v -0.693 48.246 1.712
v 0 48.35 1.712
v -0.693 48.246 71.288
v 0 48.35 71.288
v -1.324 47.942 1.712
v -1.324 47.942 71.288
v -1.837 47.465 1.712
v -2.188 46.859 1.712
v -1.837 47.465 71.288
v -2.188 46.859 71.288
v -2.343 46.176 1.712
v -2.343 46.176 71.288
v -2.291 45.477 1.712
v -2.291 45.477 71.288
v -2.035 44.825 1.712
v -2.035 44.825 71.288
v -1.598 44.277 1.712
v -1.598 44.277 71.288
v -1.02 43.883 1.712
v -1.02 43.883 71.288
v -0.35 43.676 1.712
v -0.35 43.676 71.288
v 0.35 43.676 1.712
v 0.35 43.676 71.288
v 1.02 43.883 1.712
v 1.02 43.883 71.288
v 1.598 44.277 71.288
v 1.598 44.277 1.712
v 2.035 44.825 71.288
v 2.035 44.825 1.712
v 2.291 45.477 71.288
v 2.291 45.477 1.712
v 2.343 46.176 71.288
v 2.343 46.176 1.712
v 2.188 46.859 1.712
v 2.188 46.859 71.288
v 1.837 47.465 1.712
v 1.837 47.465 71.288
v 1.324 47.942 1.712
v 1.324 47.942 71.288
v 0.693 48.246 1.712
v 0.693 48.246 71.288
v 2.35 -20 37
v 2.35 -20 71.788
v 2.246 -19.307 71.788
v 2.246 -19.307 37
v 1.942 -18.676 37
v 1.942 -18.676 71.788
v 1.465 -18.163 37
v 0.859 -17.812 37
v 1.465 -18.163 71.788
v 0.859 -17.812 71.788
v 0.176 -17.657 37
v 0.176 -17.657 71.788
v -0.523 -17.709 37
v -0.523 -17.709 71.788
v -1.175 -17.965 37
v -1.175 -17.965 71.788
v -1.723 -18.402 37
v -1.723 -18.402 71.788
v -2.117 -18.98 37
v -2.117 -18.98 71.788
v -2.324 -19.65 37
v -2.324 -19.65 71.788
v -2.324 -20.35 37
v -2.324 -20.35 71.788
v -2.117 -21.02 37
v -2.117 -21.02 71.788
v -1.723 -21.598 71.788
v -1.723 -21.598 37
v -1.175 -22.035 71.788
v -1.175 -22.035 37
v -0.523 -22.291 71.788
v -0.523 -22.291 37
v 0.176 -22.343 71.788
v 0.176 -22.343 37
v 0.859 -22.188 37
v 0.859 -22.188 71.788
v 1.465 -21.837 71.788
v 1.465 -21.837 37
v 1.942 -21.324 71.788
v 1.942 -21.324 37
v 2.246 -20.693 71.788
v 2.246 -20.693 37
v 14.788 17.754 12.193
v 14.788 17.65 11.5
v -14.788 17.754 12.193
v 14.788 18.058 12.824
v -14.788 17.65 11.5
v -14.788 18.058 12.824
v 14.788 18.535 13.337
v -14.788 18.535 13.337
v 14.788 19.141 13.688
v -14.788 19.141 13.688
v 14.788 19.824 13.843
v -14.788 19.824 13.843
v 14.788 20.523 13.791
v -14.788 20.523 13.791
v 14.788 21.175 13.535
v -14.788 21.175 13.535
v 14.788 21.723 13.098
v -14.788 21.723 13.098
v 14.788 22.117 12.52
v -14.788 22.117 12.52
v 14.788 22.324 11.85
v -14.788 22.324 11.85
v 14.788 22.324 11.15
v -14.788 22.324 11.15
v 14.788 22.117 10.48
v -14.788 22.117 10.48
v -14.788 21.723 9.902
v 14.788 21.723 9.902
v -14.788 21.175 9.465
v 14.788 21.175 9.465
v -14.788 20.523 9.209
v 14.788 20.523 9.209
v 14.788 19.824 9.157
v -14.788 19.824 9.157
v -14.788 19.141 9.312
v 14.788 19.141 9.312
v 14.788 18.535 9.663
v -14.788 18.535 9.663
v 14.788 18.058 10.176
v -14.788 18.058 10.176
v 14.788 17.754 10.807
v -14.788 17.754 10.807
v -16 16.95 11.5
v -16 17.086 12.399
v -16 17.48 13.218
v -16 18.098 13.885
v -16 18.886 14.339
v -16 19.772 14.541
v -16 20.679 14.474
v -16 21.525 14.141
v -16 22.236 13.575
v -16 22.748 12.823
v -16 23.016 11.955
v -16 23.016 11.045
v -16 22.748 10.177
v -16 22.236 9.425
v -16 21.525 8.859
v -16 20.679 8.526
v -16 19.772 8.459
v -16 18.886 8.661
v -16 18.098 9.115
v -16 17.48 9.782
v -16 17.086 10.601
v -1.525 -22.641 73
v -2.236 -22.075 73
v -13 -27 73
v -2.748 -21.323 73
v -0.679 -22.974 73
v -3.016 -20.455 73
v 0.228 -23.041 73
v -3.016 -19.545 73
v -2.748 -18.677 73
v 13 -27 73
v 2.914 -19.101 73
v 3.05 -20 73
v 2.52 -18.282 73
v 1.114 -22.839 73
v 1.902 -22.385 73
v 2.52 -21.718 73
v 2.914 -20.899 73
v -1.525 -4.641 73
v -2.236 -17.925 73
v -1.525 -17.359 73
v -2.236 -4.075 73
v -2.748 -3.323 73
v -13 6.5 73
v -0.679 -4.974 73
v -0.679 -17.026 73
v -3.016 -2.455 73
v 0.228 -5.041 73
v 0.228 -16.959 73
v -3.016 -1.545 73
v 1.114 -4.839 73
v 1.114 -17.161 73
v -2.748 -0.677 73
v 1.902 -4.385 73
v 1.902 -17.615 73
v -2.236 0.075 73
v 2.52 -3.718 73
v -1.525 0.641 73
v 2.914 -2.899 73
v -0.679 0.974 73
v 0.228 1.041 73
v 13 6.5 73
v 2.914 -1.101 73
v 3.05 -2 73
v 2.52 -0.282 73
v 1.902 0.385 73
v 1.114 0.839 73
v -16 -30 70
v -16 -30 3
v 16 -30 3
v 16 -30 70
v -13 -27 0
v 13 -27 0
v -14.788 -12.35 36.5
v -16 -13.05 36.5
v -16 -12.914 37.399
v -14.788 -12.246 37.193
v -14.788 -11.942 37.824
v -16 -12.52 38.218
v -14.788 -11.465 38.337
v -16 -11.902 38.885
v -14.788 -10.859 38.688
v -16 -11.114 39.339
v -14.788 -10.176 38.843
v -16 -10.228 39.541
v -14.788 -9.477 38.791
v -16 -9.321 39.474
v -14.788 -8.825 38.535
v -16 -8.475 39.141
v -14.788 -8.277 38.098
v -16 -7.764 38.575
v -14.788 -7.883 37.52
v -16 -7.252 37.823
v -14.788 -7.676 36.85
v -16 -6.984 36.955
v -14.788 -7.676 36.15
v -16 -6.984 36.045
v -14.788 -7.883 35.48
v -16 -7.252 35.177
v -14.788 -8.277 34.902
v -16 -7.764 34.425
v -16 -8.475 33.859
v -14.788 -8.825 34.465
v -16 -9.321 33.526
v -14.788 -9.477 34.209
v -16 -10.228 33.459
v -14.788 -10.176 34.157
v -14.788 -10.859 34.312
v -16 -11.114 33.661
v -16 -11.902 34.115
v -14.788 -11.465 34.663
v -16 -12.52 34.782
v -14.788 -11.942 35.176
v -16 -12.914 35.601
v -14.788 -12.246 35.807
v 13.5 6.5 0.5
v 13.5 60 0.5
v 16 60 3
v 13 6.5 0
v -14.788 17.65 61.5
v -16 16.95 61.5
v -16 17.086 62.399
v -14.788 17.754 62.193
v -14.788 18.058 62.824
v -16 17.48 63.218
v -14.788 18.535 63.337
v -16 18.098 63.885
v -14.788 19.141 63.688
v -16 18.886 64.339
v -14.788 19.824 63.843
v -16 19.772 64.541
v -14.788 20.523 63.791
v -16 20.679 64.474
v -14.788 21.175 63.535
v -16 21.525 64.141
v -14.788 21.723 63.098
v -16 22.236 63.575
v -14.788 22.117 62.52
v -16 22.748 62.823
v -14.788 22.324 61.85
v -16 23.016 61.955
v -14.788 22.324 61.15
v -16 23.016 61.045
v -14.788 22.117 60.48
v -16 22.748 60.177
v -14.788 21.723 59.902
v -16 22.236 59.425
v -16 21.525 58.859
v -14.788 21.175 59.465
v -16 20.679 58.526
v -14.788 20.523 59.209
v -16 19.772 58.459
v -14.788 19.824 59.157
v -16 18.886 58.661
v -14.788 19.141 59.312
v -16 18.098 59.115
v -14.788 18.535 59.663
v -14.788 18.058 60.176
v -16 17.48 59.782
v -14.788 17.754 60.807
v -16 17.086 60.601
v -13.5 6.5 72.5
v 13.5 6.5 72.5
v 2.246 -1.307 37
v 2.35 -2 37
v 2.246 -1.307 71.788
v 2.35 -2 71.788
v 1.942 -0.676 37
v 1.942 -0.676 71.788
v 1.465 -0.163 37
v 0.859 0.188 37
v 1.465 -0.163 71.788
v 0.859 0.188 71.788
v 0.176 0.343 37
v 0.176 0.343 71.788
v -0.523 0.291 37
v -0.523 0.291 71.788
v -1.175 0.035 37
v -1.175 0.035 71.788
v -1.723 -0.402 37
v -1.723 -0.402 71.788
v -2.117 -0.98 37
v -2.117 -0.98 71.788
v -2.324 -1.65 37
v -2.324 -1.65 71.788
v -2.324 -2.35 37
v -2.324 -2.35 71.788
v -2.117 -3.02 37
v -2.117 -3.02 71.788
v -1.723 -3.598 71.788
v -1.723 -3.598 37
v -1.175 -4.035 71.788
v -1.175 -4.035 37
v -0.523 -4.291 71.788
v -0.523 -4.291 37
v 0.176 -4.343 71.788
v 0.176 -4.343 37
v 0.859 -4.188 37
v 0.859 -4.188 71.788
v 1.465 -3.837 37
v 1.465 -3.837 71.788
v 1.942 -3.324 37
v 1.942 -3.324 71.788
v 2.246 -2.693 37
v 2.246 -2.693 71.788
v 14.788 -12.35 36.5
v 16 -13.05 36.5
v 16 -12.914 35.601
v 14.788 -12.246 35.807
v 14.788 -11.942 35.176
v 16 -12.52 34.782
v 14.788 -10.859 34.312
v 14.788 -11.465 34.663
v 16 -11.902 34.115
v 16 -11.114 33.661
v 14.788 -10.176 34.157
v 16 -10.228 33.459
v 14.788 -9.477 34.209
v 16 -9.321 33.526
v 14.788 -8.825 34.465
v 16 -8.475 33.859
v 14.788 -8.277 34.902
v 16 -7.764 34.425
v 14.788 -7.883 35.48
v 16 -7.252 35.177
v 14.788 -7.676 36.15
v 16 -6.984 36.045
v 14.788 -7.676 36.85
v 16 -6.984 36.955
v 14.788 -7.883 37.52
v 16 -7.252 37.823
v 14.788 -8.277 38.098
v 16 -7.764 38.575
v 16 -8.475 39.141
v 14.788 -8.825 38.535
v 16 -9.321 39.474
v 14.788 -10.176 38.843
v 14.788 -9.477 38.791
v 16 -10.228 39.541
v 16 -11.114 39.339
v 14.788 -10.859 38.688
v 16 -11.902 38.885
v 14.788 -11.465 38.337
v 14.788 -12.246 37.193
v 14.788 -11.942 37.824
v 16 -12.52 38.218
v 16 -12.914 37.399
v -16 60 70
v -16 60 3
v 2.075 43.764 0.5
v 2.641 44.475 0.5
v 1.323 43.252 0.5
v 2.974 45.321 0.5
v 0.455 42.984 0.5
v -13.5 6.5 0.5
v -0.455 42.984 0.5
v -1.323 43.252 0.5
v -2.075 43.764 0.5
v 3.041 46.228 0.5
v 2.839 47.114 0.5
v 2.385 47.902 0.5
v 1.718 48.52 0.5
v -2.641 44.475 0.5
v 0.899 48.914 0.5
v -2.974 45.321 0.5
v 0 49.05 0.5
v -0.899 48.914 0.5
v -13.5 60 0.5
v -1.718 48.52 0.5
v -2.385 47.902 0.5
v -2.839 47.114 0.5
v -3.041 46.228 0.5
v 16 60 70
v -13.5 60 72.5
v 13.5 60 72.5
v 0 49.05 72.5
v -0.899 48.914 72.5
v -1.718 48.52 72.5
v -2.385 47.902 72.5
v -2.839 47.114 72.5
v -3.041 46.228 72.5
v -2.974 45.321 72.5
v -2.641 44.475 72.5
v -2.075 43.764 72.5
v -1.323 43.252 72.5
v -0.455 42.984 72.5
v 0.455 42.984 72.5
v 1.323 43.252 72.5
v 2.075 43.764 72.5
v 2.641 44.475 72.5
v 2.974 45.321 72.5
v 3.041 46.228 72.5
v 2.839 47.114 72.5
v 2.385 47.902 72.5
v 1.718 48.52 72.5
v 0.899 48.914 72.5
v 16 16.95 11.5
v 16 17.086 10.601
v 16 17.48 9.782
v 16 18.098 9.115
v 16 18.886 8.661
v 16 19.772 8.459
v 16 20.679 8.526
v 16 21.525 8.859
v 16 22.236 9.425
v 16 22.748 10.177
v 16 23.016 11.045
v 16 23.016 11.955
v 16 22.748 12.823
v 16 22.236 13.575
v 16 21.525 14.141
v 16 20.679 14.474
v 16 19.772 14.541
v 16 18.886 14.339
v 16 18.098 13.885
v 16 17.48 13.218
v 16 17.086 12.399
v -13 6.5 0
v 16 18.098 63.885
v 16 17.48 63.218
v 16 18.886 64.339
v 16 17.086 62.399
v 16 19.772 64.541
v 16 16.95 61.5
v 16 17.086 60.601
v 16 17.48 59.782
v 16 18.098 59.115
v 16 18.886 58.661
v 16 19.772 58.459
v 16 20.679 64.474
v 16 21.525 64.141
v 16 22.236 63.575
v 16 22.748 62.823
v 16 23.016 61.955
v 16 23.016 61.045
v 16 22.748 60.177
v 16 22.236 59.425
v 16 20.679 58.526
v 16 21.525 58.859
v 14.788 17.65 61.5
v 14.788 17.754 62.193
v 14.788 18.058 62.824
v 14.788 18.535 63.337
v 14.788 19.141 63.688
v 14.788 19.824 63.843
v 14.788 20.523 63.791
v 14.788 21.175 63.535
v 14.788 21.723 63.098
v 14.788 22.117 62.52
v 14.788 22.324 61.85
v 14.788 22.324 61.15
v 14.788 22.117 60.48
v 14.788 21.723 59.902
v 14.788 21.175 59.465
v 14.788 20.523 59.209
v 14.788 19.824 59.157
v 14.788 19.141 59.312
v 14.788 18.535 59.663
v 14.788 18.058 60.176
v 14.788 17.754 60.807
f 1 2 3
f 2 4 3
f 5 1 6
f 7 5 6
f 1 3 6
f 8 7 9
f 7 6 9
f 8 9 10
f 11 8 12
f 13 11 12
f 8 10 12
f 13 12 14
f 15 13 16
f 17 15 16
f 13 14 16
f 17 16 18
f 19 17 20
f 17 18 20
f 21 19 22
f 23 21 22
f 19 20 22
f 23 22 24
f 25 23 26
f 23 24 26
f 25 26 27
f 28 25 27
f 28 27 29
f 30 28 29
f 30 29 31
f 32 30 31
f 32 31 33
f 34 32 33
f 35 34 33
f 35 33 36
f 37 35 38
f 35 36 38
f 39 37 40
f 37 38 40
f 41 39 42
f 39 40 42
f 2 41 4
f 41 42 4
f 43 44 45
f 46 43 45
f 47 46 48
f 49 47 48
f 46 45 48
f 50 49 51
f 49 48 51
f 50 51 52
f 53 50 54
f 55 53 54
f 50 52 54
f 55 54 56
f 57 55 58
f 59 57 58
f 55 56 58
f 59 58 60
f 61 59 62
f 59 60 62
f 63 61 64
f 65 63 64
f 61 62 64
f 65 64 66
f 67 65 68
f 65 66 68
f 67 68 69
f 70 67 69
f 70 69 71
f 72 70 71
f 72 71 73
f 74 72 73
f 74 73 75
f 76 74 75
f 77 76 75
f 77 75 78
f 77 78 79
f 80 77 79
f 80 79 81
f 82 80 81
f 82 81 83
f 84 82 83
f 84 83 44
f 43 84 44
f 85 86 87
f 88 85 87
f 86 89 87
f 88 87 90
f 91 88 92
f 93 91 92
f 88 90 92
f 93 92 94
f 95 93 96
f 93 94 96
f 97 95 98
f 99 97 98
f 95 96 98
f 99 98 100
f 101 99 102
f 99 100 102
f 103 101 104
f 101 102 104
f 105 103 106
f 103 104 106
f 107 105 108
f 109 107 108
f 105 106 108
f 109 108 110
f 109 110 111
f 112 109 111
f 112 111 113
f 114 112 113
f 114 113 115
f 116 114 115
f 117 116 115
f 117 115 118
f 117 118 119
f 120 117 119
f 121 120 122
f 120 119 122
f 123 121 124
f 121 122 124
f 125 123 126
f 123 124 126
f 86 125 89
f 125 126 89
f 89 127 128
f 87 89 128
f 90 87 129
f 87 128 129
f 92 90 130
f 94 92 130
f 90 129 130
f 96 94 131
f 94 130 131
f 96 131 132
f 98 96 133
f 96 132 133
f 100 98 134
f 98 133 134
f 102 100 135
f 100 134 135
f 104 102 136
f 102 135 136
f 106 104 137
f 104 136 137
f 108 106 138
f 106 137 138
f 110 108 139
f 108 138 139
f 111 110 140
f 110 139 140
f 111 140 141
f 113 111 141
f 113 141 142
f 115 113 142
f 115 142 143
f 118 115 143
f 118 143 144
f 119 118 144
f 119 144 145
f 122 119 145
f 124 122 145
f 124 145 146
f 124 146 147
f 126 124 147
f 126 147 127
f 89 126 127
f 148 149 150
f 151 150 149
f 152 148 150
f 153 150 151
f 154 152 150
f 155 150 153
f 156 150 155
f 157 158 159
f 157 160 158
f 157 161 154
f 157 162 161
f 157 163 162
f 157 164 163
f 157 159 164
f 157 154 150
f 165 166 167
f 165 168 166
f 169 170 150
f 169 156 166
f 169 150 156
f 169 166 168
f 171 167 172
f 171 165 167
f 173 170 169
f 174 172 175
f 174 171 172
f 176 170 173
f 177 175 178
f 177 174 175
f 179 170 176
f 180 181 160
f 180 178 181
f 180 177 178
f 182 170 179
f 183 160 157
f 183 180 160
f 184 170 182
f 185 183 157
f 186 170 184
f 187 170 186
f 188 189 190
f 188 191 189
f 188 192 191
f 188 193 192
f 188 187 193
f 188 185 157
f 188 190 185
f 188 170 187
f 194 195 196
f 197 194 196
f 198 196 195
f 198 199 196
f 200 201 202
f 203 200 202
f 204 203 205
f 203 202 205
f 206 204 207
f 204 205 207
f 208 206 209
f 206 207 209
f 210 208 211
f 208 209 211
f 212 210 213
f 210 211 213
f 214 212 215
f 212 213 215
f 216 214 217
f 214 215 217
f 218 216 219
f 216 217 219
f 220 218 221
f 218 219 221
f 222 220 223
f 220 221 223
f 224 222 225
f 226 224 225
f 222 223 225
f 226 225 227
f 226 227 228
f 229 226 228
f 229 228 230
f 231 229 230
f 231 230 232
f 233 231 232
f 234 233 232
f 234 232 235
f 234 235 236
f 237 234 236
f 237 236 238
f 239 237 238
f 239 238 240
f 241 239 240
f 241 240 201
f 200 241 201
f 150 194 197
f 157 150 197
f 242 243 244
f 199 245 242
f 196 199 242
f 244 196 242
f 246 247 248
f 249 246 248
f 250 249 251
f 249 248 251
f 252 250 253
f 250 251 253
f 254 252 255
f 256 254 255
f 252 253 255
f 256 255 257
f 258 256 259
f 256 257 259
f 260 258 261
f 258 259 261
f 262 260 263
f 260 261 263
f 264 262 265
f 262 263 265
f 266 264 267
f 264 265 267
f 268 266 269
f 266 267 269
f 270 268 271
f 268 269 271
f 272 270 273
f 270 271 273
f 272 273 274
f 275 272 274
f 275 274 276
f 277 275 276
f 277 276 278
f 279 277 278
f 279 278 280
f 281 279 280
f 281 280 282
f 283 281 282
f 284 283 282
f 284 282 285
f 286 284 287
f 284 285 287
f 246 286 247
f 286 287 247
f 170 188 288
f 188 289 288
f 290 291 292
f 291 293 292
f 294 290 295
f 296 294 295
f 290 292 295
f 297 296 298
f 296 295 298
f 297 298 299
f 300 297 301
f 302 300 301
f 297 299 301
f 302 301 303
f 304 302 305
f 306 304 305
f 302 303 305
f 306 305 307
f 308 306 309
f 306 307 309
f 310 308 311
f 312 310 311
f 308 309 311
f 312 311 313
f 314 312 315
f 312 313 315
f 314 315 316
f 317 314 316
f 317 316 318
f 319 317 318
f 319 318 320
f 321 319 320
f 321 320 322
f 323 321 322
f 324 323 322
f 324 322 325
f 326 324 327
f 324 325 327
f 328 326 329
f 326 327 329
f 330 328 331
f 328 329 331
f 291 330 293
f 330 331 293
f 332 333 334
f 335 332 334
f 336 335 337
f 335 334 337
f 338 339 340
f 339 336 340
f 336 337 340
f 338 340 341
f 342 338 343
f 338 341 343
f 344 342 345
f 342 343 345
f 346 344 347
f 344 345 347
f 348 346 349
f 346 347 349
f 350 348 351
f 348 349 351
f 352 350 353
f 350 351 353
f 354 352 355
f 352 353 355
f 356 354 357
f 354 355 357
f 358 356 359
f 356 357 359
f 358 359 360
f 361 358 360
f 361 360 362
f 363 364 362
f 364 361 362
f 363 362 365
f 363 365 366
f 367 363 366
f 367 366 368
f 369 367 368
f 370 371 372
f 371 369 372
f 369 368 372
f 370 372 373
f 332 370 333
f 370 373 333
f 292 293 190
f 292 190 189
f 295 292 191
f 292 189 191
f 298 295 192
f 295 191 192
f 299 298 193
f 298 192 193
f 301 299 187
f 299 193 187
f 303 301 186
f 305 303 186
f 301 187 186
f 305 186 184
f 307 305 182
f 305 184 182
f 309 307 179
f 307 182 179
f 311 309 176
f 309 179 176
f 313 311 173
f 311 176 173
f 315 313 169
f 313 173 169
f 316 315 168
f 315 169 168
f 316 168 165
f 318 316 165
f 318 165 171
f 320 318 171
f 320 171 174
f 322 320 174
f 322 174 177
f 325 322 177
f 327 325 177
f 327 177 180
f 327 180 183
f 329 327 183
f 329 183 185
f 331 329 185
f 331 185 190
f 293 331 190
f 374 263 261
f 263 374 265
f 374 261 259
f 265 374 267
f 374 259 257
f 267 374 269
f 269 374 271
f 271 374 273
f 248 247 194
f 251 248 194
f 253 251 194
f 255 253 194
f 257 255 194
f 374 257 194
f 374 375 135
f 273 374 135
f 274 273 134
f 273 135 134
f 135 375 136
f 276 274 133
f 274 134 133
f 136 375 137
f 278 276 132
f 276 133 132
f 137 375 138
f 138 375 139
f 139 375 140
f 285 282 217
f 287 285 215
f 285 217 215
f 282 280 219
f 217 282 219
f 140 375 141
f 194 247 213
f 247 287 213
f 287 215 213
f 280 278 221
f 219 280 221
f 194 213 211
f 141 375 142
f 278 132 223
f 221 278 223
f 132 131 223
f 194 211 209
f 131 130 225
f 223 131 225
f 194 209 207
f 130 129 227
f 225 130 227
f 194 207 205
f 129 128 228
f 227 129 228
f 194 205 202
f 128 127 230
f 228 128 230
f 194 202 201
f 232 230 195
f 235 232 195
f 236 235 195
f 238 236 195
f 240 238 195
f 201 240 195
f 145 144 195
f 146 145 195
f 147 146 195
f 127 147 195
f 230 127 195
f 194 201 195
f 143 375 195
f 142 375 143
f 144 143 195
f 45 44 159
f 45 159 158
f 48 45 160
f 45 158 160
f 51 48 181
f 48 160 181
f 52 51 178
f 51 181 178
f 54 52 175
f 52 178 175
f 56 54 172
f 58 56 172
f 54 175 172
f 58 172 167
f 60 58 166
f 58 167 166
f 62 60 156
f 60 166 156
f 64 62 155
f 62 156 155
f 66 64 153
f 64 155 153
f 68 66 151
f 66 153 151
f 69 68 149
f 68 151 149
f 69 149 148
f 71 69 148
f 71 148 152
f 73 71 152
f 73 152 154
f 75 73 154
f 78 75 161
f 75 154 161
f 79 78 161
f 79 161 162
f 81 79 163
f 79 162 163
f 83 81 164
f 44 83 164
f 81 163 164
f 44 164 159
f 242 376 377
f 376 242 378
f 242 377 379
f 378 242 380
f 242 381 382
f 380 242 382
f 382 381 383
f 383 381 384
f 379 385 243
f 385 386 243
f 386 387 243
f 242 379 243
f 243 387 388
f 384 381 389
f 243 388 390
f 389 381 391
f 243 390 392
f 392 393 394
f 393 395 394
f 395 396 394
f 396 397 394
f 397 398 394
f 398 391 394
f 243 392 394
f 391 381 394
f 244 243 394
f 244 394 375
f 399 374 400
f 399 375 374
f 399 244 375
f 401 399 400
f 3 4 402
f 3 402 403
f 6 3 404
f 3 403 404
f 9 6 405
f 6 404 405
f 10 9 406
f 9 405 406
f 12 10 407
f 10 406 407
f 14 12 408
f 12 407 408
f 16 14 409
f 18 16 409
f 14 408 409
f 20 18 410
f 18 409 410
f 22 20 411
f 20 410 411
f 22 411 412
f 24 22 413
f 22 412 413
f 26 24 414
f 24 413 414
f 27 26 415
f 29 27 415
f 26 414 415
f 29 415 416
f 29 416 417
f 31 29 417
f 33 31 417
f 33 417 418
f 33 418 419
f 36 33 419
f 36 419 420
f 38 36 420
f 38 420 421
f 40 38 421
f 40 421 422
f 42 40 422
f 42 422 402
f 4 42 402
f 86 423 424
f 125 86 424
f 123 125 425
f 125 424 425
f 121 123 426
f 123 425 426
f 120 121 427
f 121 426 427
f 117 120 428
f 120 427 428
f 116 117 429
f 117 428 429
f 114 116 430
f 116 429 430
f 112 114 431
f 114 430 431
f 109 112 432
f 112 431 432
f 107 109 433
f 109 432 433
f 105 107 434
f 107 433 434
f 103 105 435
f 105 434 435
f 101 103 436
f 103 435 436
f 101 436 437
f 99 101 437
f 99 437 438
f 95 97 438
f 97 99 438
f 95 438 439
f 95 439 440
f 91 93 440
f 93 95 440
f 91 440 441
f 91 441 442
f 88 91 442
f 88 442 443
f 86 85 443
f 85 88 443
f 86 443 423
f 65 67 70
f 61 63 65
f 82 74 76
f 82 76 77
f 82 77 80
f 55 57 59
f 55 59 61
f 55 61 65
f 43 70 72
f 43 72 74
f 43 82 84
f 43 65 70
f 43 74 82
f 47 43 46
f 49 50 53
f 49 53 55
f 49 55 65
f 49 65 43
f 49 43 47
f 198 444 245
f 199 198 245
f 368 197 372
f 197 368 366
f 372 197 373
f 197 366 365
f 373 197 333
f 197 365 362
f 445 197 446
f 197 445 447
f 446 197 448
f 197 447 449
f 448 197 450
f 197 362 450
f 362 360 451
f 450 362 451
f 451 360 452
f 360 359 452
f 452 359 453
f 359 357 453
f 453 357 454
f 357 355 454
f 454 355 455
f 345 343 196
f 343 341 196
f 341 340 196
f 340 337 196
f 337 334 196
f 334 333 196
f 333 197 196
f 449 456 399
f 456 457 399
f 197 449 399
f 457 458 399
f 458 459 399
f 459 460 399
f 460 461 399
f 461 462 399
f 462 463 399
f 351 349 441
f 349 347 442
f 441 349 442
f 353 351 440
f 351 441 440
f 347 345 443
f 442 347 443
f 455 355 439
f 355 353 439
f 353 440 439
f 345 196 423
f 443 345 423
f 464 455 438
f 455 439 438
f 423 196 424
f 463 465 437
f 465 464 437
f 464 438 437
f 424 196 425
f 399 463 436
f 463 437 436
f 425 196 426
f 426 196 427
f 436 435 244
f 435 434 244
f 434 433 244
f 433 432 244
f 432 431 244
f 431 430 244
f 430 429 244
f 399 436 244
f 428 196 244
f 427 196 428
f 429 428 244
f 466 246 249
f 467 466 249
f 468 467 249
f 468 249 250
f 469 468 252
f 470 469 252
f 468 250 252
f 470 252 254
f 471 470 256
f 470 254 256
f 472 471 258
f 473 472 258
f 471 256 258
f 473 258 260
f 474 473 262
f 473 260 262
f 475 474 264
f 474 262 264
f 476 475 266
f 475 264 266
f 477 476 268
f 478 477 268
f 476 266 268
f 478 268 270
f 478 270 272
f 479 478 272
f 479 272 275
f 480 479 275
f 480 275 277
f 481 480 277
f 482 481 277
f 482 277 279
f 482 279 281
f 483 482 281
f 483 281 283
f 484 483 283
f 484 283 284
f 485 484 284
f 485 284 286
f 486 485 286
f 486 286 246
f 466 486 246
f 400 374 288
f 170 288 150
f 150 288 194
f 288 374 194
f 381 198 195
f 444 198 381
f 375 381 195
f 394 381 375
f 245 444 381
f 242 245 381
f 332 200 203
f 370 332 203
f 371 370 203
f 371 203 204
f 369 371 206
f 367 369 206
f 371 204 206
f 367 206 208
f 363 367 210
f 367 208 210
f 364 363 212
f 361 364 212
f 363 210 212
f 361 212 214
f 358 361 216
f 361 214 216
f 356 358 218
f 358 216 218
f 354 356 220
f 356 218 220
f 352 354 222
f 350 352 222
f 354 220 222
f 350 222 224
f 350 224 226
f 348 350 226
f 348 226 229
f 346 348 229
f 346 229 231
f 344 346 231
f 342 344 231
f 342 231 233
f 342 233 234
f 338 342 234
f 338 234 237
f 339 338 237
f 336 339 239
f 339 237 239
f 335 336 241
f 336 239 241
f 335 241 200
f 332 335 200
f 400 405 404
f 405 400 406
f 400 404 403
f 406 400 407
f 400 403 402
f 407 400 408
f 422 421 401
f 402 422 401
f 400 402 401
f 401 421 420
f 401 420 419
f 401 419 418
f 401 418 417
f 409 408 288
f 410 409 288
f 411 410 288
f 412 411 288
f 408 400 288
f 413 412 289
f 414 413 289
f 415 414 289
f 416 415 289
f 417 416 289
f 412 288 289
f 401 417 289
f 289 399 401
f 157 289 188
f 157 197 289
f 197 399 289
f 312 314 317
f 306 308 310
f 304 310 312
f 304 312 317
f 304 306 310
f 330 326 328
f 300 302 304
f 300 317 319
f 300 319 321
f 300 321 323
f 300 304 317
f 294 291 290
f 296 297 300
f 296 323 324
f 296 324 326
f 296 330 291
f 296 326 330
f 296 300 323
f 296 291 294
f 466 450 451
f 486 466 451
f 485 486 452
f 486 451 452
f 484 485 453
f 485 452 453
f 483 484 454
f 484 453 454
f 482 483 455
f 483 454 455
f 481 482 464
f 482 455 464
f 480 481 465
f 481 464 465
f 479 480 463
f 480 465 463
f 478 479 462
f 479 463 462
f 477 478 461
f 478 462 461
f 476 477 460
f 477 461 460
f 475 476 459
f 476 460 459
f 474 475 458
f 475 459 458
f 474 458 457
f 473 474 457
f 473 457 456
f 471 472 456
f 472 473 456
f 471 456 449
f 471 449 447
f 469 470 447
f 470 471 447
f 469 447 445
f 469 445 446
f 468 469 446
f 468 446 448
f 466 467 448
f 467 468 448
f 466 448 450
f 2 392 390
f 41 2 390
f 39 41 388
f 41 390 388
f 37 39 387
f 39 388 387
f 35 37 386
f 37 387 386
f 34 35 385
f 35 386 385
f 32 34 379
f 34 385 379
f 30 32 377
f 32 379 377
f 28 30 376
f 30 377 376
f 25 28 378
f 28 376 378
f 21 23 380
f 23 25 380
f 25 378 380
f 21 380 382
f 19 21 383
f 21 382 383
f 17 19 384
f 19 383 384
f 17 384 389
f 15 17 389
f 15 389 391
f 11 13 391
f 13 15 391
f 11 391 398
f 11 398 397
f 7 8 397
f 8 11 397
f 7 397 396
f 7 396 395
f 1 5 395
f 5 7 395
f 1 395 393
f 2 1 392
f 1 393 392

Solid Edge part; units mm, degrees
sketch "Sketch1" plane through (0, 0, 0) normal (0, 0, 1) x (1, 0, 0)
  line L0 (-16, -30) -> (16, -30)
  line L1 (16, -30) -> (16, 30)
  line L2 (16, 30) -> (-16, 30)
  line L3 (-16, 30) -> (-16, -30)
  dimension "D1" = 32
  dimension "D2" = 60
extrude "Protrusion1" add sketch "Sketch1" along normal blind 73
sketch "Sketch2" plane through (0, 0, 73) normal (0, 0, 1) x (1, 0, 0)
  circle A0 centre (0, -20) radius 2.35
  circle A1 centre (0, -2) radius 2.35
  dimension "D1" = 4.7
  dimension "D2" = 18
  dimension "D3" = 10
extrude "Extrusionsausschnitt_1" cut sketch "Sketch2" against normal blind 36
chamfer "Fase_3" distance 0.7 angle 60 2 edges at (-2.35, -2, 73) (-2.35, -20, 73) measured on face at (-10.9867, -19.4, 73)
chamfer "Fase_6" distance 3 angle 45 4 edges at (-16, 0, 73) (-16, 0, 0) (16, 0, 73) (16, 0, 0)
chamfer "Fase_7" distance 3 angle 45 2 edges at (0, -30, 73) (0, -30, 0)
sketch "Sketch3" plane through (-16, 0, 36.5) normal (-1, 0, 0) x (0, -1, 0)
  circle A0 centre (-20, 25) radius 2.35
  circle A1 centre (-20, -25) radius 2.35
  circle A2 centre (10, 0) radius 2.35
  dimension "D1" = 4.7
  dimension "D2" = 50
  dimension "D3" = 10
  dimension "D4" = 30
extrude "Cutout1" cut sketch "Sketch3" against normal through all
chamfer "Fase_9" distance 0.7 angle 60 6 edges at (-16, 22.35, 61.5) (-16, -7.65, 36.5) (-16, 22.35, 11.5) (16, 20, 59.15) (16, 20, 9.15) (16, -10, 34.15) measured on face at (-16, 20.6, 58.1633) measured on face at (16, -20.6, 58.1633)
sketch "Sketch4" plane through (-16, 0, 36.5) normal (-1, 0, 0) x (0, -1, 0)
  line L0 (-6.5, 36.5) -> (-30, 36.5)
  line L1 (-30, 36.5) -> (-30, 36)
  line L2 (-30, 36) -> (-6.5, 36)
  line L3 (-6.5, 36) -> (-6.5, 36.5)
  line L4 (-30, -36.5) -> (-6.5, -36.5)
  line L5 (-6.5, -36.5) -> (-6.5, -36)
  line L6 (-6.5, -36) -> (-30, -36)
  line L7 (-30, -36) -> (-30, -36.5)
  dimension "D1" = 0.5
  dimension "D2" = 36.5
  dimension "D3" = 0.5
  dimension "D4" = 36.5
extrude "Cutout2" cut sketch "Sketch4" against normal through all
sketch "Sketch5" plane through (0, 30, 36.5) normal (0, 1, 0) x (1, 0, 0)
  line L0 (-16, 33.5) -> (-13.5, 36)
  line L1 (-13.5, 36) -> (13.5, 36)
  line L2 (13.5, 36) -> (16, 33.5)
  line L3 (16, 33.5) -> (16, -33.5)
  line L4 (16, -33.5) -> (13.5, -36)
  line L5 (13.5, -36) -> (-13.5, -36)
  line L6 (-13.5, -36) -> (-16, -33.5)
  line L7 (-16, -33.5) -> (-16, 33.5)
extrude "Extrusionsausprägung_2" add sketch "Sketch5" along normal blind 26
sketch "Sketch6" plane through (0, 36.25, 72.5) normal (0, 0, 1) x (0, 1, 0)
  circle A0 centre (9.75, 0) radius 2.35
  dimension "D1" = 10
extrude "Cutout3" cut sketch "Sketch6" against normal through all
chamfer "Fase_10" distance 0.7 angle 60 2 edges at (0, 43.65, 72.5) (-2.35, 46, 0.5) measured on face at (8.73, 48.245, 72.5) measured on face at (8.73, 14.255, 0.5)
sketch "Sketch7" plane through (0, 56, 36.5) normal (0, 1, 0) x (-1, 0, 0)
  line L0 (-13.5, 36) -> (-16, 33.5)
  line L1 (-16, 33.5) -> (-16, -33.5)
  line L2 (-16, -33.5) -> (-13.5, -36)
  line L3 (-13.5, -36) -> (13.5, -36)
  line L4 (13.5, -36) -> (16, -33.5)
  line L5 (16, -33.5) -> (16, 33.5)
  line L6 (16, 33.5) -> (13.5, 36)
  line L7 (13.5, 36) -> (-13.5, 36)
extrude "Extrusionsausprägung_3" add sketch "Sketch7" along normal blind 4
properties material "Nylon, allgemein"
